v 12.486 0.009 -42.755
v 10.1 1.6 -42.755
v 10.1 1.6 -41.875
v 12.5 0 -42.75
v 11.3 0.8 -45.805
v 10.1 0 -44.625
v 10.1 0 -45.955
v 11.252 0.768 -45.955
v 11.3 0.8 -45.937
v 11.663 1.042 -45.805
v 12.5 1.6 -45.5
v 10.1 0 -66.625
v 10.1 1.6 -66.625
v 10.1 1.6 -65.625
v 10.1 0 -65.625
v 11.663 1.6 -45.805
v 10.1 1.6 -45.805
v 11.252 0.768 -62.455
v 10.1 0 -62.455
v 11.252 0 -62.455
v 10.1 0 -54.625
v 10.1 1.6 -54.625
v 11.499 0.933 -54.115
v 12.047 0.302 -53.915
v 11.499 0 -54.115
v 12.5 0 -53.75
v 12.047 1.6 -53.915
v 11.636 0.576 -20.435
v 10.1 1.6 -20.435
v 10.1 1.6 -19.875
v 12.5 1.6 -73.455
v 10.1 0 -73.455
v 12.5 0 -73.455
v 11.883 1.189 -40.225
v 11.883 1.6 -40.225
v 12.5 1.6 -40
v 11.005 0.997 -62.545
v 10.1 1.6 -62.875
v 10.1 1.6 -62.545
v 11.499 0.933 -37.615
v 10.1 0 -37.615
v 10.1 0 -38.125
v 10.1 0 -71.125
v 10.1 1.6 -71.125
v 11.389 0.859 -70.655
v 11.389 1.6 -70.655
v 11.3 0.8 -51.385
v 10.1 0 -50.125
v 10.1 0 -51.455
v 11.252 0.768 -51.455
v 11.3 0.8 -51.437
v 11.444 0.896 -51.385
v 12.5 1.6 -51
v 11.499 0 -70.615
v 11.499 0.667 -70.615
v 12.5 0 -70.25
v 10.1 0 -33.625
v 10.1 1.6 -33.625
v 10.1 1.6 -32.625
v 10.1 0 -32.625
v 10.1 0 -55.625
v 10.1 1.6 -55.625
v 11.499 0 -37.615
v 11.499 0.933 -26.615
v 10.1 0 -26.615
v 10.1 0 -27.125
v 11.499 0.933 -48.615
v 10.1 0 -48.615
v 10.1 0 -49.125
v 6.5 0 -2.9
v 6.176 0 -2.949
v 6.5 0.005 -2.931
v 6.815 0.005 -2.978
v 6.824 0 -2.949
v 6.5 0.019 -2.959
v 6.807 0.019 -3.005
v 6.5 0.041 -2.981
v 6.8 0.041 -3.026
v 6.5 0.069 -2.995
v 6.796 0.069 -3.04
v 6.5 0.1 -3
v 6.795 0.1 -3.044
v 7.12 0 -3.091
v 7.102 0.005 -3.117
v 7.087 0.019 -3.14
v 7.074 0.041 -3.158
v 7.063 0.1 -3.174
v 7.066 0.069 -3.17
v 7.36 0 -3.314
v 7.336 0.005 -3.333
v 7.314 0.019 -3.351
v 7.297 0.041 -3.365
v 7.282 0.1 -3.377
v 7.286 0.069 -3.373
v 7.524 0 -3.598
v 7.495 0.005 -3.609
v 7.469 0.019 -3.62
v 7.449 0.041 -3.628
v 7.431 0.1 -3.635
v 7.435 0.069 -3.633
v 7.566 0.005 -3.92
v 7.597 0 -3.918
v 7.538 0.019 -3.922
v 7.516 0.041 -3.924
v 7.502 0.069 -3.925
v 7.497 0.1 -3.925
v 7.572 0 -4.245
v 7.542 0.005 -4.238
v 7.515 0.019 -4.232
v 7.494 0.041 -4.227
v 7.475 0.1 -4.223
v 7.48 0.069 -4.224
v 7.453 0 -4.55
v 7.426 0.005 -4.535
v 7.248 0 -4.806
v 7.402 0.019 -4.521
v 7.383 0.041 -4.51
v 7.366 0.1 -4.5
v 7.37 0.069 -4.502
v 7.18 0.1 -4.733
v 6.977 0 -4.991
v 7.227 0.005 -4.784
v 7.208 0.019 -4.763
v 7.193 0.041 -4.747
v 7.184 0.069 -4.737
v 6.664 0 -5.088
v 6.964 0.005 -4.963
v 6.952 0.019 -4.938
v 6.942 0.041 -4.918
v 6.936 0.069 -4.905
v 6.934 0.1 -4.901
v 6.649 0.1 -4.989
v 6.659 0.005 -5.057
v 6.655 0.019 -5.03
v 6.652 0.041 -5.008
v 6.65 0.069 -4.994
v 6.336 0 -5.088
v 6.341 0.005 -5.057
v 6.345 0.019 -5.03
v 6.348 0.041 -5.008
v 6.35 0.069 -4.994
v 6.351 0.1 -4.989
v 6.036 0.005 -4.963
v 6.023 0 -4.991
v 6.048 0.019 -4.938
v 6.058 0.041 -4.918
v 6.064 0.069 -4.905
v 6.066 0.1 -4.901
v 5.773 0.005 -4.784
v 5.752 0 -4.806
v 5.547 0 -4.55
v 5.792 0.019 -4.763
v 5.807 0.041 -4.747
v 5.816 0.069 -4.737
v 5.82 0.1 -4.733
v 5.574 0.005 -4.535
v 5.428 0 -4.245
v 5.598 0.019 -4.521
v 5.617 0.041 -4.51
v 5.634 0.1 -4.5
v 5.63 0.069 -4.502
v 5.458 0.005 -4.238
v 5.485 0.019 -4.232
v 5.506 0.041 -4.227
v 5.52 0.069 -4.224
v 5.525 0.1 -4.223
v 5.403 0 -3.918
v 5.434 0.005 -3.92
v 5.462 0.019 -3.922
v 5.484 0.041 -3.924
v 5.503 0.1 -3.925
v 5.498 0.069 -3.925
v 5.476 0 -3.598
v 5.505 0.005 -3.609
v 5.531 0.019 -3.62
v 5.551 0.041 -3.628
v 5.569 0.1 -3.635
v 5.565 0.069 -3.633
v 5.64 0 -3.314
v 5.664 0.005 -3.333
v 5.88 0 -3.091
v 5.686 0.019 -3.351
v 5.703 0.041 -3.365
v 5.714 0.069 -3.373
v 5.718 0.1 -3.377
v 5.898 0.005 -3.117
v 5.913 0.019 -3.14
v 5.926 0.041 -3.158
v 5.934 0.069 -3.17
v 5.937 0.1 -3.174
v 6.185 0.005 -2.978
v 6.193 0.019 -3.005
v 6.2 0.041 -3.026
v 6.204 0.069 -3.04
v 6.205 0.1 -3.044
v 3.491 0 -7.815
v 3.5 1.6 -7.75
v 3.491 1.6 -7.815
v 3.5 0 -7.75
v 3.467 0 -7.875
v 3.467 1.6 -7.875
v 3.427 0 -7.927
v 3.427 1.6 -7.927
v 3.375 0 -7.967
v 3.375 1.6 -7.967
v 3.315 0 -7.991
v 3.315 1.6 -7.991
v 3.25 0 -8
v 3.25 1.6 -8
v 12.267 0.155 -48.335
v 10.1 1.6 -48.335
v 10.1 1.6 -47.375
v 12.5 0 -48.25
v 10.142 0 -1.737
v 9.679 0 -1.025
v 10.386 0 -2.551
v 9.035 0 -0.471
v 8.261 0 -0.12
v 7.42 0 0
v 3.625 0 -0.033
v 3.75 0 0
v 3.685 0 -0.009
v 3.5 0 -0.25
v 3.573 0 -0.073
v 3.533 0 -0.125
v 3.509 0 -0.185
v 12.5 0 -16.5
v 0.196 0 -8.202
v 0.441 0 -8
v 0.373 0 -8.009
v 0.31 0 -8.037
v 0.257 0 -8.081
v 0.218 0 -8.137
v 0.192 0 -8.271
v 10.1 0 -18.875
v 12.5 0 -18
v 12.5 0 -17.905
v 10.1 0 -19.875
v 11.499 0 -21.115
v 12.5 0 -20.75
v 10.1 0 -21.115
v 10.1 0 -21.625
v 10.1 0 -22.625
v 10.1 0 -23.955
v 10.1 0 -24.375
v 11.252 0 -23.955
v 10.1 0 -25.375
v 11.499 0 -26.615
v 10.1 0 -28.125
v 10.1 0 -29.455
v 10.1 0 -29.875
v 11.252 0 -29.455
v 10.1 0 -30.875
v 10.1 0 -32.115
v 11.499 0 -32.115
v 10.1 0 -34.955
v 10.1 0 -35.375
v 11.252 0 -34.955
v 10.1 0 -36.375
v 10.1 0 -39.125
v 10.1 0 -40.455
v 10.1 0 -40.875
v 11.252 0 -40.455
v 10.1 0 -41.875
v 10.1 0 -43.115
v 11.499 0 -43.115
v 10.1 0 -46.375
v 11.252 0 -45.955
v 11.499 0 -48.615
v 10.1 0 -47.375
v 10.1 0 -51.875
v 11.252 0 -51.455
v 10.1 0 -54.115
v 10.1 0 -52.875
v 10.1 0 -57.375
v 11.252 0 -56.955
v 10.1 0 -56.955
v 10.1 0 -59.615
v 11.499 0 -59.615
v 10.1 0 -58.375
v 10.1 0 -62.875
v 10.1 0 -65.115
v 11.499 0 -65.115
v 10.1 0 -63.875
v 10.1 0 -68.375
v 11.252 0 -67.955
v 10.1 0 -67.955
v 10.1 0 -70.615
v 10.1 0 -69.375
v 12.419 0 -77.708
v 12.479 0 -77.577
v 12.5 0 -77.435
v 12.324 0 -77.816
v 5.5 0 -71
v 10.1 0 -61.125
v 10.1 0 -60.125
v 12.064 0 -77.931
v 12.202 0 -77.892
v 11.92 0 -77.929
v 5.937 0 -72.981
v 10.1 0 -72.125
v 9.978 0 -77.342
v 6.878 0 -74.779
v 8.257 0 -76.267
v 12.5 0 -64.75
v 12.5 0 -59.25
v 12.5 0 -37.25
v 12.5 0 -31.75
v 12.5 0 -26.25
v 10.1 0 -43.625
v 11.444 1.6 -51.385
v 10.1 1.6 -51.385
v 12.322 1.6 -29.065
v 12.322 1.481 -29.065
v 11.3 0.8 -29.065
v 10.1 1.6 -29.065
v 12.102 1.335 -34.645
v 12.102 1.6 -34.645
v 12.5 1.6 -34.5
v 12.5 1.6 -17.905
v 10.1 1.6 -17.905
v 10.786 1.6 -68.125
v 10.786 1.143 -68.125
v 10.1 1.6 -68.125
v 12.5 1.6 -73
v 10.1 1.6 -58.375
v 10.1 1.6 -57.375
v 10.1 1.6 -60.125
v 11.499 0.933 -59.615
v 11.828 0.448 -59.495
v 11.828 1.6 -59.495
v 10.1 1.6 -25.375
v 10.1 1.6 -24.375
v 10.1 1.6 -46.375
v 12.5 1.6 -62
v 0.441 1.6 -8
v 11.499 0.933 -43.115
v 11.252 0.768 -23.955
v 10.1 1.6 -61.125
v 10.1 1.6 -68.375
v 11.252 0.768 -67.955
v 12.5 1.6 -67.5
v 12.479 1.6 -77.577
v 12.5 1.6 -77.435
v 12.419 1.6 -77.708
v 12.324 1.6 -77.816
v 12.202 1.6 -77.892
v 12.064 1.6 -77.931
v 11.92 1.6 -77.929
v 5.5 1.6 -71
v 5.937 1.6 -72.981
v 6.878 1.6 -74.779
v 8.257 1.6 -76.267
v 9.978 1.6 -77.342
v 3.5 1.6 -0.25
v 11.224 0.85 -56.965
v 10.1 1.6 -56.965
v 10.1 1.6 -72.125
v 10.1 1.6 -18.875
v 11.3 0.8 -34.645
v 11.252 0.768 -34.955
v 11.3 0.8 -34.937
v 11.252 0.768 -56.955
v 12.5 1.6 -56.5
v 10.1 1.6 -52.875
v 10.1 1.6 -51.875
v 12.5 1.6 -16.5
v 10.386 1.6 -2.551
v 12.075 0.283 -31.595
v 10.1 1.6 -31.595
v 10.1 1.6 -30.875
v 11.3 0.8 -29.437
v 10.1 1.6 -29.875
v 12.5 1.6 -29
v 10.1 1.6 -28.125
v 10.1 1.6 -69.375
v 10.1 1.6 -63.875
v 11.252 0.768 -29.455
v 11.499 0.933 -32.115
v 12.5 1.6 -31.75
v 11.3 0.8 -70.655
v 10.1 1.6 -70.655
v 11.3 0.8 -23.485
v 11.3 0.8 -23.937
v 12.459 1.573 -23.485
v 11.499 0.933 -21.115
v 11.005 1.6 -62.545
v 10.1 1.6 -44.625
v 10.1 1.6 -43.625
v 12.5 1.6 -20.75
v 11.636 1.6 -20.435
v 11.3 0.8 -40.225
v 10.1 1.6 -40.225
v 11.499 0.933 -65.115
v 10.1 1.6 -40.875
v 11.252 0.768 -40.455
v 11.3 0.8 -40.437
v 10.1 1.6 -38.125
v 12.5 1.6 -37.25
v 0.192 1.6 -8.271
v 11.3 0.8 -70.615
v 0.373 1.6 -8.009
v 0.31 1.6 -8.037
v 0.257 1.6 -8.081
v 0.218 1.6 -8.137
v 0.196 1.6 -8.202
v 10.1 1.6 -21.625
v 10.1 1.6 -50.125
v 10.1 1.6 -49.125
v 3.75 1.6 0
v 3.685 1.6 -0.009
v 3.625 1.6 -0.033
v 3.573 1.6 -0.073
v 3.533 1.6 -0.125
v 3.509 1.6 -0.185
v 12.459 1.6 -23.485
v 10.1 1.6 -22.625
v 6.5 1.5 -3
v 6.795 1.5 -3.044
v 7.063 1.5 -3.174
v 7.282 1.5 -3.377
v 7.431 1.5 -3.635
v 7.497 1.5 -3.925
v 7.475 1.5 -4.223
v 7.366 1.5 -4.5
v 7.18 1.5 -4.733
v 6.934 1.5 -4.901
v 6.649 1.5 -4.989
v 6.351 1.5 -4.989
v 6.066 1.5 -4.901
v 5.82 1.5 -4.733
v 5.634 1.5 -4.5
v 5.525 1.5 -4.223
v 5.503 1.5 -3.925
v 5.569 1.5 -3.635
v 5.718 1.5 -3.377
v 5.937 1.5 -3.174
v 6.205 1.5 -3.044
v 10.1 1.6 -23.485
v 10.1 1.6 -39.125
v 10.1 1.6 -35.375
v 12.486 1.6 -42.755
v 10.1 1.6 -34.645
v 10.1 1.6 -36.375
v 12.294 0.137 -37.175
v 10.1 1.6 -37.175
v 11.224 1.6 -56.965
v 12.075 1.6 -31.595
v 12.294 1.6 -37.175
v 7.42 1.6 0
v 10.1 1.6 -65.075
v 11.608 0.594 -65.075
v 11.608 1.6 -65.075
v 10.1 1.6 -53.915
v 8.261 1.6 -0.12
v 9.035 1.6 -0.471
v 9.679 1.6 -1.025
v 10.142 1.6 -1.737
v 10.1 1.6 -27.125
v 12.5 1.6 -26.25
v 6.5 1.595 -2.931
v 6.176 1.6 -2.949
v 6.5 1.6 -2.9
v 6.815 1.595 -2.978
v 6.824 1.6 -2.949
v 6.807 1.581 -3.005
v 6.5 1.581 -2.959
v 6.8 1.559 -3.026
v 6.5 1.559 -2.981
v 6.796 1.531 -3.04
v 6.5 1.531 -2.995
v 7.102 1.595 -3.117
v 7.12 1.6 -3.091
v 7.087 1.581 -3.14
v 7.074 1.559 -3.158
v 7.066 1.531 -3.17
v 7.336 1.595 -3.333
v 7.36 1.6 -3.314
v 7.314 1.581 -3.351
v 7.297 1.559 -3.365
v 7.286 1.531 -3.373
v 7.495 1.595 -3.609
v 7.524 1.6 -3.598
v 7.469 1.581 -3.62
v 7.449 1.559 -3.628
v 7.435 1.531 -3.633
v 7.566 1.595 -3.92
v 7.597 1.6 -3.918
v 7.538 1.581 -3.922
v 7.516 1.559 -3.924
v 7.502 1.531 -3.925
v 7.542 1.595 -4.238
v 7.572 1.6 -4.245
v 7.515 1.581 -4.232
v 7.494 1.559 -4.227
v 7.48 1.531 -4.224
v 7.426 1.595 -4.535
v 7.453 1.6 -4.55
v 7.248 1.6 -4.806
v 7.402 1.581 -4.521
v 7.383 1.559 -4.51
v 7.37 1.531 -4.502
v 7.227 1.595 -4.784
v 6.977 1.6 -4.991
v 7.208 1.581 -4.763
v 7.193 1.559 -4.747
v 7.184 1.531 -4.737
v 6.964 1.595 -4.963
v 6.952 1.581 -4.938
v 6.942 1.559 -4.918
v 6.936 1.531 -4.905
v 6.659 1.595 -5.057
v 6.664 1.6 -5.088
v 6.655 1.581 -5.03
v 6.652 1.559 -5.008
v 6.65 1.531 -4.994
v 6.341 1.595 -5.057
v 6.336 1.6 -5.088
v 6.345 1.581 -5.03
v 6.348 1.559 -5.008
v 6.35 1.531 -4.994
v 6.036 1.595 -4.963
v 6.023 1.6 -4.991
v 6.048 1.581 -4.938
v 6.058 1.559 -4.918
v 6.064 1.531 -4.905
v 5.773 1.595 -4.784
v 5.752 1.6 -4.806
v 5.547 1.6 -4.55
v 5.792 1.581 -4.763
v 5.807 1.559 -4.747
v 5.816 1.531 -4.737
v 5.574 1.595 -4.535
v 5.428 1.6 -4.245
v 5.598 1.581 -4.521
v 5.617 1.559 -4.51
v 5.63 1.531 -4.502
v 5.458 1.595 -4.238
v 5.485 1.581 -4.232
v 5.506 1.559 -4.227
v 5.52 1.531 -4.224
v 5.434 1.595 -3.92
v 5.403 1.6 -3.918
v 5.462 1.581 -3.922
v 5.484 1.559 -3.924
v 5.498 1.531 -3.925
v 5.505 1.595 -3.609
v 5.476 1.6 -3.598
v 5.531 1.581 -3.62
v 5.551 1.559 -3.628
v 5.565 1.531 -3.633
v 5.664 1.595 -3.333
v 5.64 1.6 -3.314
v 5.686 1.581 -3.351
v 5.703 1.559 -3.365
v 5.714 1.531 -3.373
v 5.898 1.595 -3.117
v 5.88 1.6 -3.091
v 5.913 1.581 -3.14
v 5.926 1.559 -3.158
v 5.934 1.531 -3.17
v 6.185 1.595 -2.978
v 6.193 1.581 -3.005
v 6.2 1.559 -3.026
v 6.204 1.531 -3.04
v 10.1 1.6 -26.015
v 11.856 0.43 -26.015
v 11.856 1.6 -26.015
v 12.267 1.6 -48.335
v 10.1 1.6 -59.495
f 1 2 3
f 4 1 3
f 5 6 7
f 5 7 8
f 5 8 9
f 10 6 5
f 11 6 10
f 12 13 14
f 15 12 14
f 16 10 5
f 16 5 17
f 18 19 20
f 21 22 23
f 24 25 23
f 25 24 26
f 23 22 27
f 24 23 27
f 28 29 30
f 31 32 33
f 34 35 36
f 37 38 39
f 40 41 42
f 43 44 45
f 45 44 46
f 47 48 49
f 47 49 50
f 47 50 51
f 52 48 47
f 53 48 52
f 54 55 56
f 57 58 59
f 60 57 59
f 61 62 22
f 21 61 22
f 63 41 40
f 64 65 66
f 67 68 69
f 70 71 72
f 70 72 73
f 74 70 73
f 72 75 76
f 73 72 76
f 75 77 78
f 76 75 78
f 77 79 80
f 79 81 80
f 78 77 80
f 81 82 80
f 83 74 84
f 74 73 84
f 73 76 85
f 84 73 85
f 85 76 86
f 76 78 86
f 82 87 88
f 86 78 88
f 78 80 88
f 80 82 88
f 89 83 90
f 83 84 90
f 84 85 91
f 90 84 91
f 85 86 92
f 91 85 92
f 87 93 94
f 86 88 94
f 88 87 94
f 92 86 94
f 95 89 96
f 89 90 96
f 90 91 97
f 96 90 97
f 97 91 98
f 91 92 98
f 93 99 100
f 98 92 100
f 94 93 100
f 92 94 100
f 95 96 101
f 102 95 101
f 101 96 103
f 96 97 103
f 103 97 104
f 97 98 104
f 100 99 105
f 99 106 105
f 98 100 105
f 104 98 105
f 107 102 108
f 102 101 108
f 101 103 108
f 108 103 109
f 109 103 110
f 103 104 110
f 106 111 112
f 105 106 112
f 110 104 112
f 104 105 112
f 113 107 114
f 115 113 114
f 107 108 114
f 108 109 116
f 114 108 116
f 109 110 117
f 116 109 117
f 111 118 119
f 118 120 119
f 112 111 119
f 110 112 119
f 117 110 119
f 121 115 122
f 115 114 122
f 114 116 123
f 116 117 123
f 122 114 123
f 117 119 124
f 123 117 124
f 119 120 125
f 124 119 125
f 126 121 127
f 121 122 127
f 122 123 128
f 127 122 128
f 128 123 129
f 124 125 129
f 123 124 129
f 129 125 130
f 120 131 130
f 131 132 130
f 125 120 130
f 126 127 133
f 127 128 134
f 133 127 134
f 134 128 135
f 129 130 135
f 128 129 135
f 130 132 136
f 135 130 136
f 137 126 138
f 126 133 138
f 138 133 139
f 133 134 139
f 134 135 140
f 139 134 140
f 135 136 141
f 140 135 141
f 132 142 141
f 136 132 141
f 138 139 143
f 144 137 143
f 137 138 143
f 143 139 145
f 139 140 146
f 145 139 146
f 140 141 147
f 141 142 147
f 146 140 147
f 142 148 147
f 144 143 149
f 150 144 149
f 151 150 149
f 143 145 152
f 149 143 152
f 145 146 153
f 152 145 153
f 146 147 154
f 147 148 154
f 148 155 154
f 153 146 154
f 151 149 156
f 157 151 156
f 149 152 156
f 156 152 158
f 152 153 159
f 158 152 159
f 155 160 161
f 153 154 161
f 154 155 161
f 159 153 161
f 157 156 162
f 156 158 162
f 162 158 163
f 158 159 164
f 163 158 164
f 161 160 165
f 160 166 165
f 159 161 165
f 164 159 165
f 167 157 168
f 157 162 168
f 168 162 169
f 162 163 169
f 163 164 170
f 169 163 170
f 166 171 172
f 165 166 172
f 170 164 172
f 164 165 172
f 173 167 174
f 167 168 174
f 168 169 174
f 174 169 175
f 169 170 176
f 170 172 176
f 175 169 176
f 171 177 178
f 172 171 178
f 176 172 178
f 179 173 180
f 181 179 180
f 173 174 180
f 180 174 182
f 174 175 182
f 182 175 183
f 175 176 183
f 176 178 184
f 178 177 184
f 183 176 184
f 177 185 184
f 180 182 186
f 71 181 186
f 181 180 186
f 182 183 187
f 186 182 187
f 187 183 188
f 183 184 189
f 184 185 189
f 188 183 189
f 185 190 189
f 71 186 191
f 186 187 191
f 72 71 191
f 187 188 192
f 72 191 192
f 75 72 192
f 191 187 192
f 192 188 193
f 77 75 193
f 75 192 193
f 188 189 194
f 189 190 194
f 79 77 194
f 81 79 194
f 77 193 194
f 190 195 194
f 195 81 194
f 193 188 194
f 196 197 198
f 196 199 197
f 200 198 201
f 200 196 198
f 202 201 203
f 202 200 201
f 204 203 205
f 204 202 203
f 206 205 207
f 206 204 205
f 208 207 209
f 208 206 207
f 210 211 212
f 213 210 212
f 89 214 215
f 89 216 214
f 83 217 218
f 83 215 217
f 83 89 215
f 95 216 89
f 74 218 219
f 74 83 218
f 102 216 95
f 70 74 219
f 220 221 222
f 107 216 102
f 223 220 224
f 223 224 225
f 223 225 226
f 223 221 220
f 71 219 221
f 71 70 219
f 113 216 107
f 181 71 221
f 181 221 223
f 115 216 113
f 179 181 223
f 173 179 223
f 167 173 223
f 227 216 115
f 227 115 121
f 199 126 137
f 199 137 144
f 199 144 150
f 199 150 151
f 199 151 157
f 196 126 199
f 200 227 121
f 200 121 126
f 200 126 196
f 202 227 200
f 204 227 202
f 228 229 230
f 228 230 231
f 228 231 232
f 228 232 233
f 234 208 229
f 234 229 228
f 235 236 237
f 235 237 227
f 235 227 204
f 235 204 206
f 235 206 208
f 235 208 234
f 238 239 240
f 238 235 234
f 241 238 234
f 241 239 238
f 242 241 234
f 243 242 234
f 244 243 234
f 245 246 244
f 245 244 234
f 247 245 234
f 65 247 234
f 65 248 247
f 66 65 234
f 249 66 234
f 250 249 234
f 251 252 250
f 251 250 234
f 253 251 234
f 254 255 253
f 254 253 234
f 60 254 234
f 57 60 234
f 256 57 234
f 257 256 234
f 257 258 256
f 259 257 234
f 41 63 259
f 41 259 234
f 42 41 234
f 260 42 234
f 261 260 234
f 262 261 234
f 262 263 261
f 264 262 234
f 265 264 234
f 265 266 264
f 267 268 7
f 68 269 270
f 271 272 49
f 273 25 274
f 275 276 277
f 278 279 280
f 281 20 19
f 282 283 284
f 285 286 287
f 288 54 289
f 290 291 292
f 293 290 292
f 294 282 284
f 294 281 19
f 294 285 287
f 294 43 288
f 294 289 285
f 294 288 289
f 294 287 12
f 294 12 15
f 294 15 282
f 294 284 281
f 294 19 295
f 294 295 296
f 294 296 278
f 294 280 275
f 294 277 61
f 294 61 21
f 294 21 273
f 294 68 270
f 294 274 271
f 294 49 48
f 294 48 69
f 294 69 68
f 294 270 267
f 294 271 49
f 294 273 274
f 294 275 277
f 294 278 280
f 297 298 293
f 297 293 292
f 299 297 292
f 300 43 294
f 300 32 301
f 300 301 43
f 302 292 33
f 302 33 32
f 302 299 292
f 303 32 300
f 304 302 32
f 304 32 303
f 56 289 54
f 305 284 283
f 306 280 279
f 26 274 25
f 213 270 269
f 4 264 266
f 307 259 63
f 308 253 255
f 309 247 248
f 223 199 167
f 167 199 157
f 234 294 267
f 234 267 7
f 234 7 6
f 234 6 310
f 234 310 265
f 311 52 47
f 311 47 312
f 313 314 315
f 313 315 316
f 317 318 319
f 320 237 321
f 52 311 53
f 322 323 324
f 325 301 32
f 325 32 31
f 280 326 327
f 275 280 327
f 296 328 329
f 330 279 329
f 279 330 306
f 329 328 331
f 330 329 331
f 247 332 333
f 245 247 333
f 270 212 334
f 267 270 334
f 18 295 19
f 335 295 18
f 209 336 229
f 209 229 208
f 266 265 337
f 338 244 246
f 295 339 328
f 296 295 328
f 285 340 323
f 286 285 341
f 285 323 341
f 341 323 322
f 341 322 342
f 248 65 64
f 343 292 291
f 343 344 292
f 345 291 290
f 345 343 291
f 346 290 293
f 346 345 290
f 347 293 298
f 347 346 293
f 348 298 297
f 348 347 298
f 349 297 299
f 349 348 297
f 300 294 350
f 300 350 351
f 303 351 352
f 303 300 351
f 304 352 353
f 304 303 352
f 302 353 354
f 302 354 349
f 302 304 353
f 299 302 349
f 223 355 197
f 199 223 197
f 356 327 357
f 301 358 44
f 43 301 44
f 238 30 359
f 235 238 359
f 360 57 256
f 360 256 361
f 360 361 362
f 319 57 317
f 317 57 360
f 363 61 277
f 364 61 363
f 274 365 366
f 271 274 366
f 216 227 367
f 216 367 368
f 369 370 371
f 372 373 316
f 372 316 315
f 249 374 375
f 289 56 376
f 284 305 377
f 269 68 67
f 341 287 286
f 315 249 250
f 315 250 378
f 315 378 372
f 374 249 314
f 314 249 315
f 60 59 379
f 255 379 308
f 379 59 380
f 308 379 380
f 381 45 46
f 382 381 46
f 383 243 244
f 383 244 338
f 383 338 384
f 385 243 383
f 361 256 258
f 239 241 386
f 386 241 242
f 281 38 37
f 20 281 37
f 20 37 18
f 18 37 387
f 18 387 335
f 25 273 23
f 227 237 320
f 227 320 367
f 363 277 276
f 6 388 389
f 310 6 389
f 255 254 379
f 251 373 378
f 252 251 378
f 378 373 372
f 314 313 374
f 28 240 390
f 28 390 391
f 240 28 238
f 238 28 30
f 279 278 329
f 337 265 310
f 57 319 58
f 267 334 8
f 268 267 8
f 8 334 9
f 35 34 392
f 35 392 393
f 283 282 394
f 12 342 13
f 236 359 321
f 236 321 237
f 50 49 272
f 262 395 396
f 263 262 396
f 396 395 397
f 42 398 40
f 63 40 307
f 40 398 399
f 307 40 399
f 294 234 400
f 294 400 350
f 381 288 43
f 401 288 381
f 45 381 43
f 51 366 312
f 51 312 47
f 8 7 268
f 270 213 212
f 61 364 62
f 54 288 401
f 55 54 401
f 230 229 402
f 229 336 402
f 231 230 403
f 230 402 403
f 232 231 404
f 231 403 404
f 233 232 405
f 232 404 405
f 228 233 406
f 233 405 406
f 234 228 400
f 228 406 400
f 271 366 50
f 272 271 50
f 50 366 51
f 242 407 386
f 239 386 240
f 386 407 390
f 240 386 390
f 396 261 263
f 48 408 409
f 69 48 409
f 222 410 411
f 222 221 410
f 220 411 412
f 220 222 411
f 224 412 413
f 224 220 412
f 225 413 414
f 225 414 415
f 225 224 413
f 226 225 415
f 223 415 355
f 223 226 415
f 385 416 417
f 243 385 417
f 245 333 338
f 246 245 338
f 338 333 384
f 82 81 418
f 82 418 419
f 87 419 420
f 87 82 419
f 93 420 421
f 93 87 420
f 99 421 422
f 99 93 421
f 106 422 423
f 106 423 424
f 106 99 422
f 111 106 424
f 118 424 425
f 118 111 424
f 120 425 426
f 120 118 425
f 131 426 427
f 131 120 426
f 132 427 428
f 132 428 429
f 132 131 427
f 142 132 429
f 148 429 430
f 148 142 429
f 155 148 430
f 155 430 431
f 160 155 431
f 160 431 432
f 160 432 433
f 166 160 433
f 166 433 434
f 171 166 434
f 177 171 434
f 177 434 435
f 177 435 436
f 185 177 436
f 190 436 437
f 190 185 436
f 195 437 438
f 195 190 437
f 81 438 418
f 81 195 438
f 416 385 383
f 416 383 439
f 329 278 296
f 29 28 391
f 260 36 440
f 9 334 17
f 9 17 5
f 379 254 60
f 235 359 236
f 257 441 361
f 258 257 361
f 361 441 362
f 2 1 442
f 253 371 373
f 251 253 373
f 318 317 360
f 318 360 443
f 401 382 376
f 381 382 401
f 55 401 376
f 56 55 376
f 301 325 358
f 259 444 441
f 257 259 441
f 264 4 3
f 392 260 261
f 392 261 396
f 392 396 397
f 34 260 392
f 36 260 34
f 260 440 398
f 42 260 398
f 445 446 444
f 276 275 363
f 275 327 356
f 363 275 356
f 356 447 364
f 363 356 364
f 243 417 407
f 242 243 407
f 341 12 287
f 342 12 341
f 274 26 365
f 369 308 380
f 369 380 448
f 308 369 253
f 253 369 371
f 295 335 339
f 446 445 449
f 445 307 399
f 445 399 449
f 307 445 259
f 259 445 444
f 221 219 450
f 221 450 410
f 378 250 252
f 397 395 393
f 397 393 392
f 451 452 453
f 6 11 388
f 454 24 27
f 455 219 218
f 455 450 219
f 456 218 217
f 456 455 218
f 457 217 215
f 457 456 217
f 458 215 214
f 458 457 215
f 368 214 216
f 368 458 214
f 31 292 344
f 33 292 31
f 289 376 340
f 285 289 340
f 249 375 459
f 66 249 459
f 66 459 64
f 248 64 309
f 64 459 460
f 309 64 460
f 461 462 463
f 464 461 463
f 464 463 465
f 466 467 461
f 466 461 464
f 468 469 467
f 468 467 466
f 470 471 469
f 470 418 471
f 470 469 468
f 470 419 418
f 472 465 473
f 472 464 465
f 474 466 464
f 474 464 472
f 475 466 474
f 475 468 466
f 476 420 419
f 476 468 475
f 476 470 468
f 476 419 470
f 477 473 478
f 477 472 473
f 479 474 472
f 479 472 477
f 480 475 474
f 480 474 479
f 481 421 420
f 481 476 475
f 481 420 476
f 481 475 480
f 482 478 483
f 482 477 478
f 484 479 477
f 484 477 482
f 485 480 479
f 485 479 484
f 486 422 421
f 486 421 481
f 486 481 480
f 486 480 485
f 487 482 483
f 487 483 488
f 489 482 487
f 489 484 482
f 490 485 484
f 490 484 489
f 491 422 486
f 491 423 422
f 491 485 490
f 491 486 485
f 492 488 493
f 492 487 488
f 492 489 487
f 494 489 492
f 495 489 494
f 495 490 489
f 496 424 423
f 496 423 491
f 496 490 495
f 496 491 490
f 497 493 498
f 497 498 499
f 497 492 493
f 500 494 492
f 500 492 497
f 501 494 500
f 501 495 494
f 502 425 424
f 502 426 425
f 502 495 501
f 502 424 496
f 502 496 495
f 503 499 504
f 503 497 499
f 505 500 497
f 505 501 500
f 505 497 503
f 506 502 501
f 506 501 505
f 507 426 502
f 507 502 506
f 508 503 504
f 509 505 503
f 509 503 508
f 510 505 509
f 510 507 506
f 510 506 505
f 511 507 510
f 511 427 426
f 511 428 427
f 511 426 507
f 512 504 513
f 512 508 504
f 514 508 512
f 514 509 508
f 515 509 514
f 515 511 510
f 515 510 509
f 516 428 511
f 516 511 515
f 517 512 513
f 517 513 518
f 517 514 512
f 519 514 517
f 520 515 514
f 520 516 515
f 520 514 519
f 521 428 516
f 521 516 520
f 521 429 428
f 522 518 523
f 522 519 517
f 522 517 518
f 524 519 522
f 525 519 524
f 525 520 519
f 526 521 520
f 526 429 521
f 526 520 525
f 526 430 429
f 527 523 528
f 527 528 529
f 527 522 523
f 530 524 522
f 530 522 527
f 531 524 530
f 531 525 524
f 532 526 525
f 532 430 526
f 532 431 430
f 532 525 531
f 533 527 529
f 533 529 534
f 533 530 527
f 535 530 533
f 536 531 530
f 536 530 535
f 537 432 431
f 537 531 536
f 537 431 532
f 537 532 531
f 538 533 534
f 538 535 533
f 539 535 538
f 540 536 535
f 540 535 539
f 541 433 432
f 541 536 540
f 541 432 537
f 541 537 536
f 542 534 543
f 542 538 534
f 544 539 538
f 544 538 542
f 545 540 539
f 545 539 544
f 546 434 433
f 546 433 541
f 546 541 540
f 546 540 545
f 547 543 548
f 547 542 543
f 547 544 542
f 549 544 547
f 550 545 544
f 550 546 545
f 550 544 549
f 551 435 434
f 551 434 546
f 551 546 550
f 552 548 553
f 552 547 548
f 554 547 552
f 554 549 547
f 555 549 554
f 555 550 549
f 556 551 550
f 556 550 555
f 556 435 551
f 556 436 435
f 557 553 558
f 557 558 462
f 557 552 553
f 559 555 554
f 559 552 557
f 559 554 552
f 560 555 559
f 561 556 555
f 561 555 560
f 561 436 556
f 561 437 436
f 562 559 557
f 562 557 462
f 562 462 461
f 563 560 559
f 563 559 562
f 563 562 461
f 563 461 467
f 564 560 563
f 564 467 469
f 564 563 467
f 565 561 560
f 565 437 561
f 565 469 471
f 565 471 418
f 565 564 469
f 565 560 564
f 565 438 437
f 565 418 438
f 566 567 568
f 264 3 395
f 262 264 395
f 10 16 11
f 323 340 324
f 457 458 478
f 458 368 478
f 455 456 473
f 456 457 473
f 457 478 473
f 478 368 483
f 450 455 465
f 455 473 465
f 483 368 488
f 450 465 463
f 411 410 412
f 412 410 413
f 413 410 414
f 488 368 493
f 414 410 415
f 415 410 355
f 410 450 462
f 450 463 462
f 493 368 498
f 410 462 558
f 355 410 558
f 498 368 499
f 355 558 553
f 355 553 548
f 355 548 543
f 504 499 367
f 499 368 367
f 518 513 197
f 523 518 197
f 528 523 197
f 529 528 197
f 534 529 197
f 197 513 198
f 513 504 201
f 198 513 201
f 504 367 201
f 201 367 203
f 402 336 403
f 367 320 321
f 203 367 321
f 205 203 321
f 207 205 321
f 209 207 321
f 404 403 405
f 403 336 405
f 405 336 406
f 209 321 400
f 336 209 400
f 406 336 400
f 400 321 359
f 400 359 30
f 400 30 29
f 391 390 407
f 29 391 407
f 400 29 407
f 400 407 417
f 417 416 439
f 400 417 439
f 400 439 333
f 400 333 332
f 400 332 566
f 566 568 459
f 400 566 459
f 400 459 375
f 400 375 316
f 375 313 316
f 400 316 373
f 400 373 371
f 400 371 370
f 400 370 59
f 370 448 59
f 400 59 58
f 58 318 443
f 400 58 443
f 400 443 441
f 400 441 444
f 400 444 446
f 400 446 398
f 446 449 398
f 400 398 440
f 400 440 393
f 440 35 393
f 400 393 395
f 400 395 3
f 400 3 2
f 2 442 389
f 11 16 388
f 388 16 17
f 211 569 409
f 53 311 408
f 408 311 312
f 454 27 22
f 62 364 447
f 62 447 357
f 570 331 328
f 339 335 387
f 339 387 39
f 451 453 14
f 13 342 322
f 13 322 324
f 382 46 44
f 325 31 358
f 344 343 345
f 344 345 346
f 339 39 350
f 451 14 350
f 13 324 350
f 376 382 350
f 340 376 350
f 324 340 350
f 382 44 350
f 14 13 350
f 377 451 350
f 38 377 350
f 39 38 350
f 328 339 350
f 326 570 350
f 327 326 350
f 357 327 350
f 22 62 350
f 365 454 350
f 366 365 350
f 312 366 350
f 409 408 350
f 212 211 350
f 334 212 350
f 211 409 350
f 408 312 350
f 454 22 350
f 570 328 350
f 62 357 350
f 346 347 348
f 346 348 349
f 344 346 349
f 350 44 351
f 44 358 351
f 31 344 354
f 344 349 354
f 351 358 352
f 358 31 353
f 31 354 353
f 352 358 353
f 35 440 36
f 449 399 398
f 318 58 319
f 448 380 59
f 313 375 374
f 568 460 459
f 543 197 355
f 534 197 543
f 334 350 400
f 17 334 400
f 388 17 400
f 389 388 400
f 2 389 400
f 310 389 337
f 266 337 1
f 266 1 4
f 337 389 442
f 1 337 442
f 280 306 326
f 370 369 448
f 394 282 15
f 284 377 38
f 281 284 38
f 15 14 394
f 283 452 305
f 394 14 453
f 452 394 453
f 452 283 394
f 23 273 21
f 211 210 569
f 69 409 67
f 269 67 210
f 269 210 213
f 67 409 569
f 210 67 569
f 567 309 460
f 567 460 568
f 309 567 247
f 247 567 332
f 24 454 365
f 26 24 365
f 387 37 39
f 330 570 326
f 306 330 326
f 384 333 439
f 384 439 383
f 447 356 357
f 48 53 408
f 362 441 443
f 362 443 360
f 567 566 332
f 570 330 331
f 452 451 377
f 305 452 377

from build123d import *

# Parameters (mm, degrees)
SKETCH1_R              = 1
BOSS_EXTRUDE1_DEPTH    = 1.6
SKETCH2_W              = 3.5
SKETCH2_H              = 8
CUT_EXTRUDE1_DEPTH     = 80.011454866
FILLET1_R              = 3
FILLET3_R              = 0.1
FILLET4_R              = 0.25
CUT_EXTRUDE2_DEPTH     = 80.011454866
LPATTERN1_COUNT        = 20
LPATTERN1_PITCH        = 2.75
FILLET5_R              = 0.5
CUT_EXTRUDE3_START     = 5.602471982
CUT_EXTRUDE3_OUTLINE_W = 6
CUT_EXTRUDE3_OUTLINE_H = 2.84
CUT_EXTRUDE3_DEPTH     = 1.331280471
CUT_EXTRUDE4_REACH     = 81.346
SKETCH7_W              = 2.53
SKETCH7_H              = 4


with BuildPart() as part:
    # Sketch1 → Boss-Extrude1 (new body)
    with BuildSketch(Plane(origin=(0, 0, 0), x_dir=(1, 0, 0), z_dir=(0, 1, 0))):
        with BuildLine():
            Line((0, 0), (0, 6))
            Line((0, 6), (5.5, 71))
            ThreePointArc((5.5, 71), (7.72044875, 75.77955125), (12.5, 78))
            Line((12.5, 78), (12.5, 16.5))
            Line((12.5, 16.5), (10, 0))
            Line((10, 0), (0, 0))
        make_face()
        with Locations(Location((6.5, 4, 0), (0, 0, 270))):
            Circle(SKETCH1_R, mode=Mode.SUBTRACT)
    extrude(amount=BOSS_EXTRUDE1_DEPTH)

    # Sketch2 → Cut-Extrude1 (cut, through all)
    with BuildSketch(Plane(origin=(0, 1.6, 0), x_dir=(1, 0, 0), z_dir=(0, 1, 0))):
        with Locations((1.75, 4)):
            Rectangle(SKETCH2_W, SKETCH2_H)
    extrude(amount=-CUT_EXTRUDE1_DEPTH, mode=Mode.SUBTRACT)

    # Fillet1
    fillet1_edges = [part.edges().sort_by_distance(p)[0] for p in [
        (10, 0.8, 0),
    ]]
    fillet(fillet1_edges, radius=FILLET1_R)

    # Fillet3
    fillet3_edges = [part.edges().sort_by_distance(p)[0] for p in [
        (6.5, 0, -5),
        (6.5, 1.6, -5),
    ]]
    fillet(fillet3_edges, radius=FILLET3_R)

    # Fillet4
    fillet4_edges = [part.edges().sort_by_distance(p)[0] for p in [
        (0.169230769, 0.8, -8),
        (3.5, 0.8, -8),
        (3.5, 0.8, 0),
    ]]
    fillet(fillet4_edges, radius=FILLET4_R)

    # Sketch3 → Cut-Extrude2 (cut, through all)
    with BuildSketch(Plane(origin=(0, 1.6, 0), x_dir=(1, 0, 0), z_dir=(0, 1, 0))):
        Polygon((12.5, 73), (10.1, 72.125), (10.1, 71.125), (12.5, 70.25), align=None)
    cut_extrude2 = extrude(amount=-CUT_EXTRUDE2_DEPTH, mode=Mode.SUBTRACT)

    # LPattern1: Cut-Extrude2 ×20
    with Locations(*[(0, 0, i * LPATTERN1_PITCH) for i in range(1, LPATTERN1_COUNT)]):
        add(cut_extrude2, mode=Mode.SUBTRACT)

    # Fillet5
    fillet5_edges = [part.edges().sort_by_distance(p)[0] for p in [
        (12.5, 0.8, -78),
    ]]
    fillet(fillet5_edges, radius=FILLET5_R)

    # Cut-Extrude3: read off the stored shape, not the designer's step
    # Cut-Extrude3 outline → Cut-Extrude3 (cut)
    with BuildSketch(Plane(origin=(0, 0, 0), x_dir=(0.8320502943378438, 0.5547001962252289, 0), z_dir=(0.5547001962252289, -0.8320502943378438, 0)).offset(CUT_EXTRUDE3_START)):
        with Locations((10, -22.535035801)):
            Rectangle(CUT_EXTRUDE3_OUTLINE_W, CUT_EXTRUDE3_OUTLINE_H)
        with Locations((10, -28.035035801)):
            Rectangle(CUT_EXTRUDE3_OUTLINE_W, CUT_EXTRUDE3_OUTLINE_H)
        with Locations((10, -33.535035801)):
            Rectangle(CUT_EXTRUDE3_OUTLINE_W, CUT_EXTRUDE3_OUTLINE_H)
        with Locations((10, -39.035035801)):
            Rectangle(CUT_EXTRUDE3_OUTLINE_W, CUT_EXTRUDE3_OUTLINE_H)
        with Locations((10, -44.535035801)):
            Rectangle(CUT_EXTRUDE3_OUTLINE_W, CUT_EXTRUDE3_OUTLINE_H)
        with Locations((10, -50.035035801)):
            Rectangle(CUT_EXTRUDE3_OUTLINE_W, CUT_EXTRUDE3_OUTLINE_H)
        with Locations((10, -55.535035801)):
            Rectangle(CUT_EXTRUDE3_OUTLINE_W, CUT_EXTRUDE3_OUTLINE_H)
        with Locations((10, -61.035035801)):
            Rectangle(CUT_EXTRUDE3_OUTLINE_W, CUT_EXTRUDE3_OUTLINE_H)
        with Locations((10, -66.535035801)):
            Rectangle(CUT_EXTRUDE3_OUTLINE_W, CUT_EXTRUDE3_OUTLINE_H)
        with Locations((10, -72.035035801)):
            Rectangle(CUT_EXTRUDE3_OUTLINE_W, CUT_EXTRUDE3_OUTLINE_H)
    extrude(amount=CUT_EXTRUDE3_DEPTH, mode=Mode.SUBTRACT)

    # Cut-Extrude4: up to this plane
    cut_extrude4_end = Plane(origin=(10.1, 1.6, 0), z_dir=(0.5547001962252291, 0.8320502943378437, 0))
    # Sketch7 → Cut-Extrude4 (cut, up to the surface)
    with BuildSketch(Plane(origin=(15, 0, 0), x_dir=(0, 0, -1), z_dir=(1, 0, 0)), mode=Mode.PRIVATE) as cut_extrude4_sk1:
        with Locations((69.390035801, 0.6)):
            Rectangle(SKETCH7_W, SKETCH7_H)
    cut_extrude4_tool1 = split(extrude(cut_extrude4_sk1.sketch, amount=-CUT_EXTRUDE4_REACH, mode=Mode.PRIVATE), bisect_by=cut_extrude4_end, keep=Keep.BOTH, mode=Mode.PRIVATE)
    add(cut_extrude4_tool1.solids().sort_by_distance((15, 0.6, -69.390036))[0], mode=Mode.SUBTRACT)
    # Sketch7 → Cut-Extrude4 (cut, up to the surface)
    with BuildSketch(Plane(origin=(15, 0, 0), x_dir=(0, 0, -1), z_dir=(1, 0, 0)), mode=Mode.PRIVATE) as cut_extrude4_sk2:
        with Locations((63.810035801, 0.6)):
            Rectangle(SKETCH7_W, SKETCH7_H)
    cut_extrude4_tool2 = split(extrude(cut_extrude4_sk2.sketch, amount=-CUT_EXTRUDE4_REACH, mode=Mode.PRIVATE), bisect_by=cut_extrude4_end, keep=Keep.BOTH, mode=Mode.PRIVATE)
    add(cut_extrude4_tool2.solids().sort_by_distance((15, 0.6, -63.810036))[0], mode=Mode.SUBTRACT)
    # Sketch7 → Cut-Extrude4 (cut, up to the surface)
    with BuildSketch(Plane(origin=(15, 0, 0), x_dir=(0, 0, -1), z_dir=(1, 0, 0)), mode=Mode.PRIVATE) as cut_extrude4_sk3:
        with Locations((58.230035801, 0.6)):
            Rectangle(SKETCH7_W, SKETCH7_H)
    cut_extrude4_tool3 = split(extrude(cut_extrude4_sk3.sketch, amount=-CUT_EXTRUDE4_REACH, mode=Mode.PRIVATE), bisect_by=cut_extrude4_end, keep=Keep.BOTH, mode=Mode.PRIVATE)
    add(cut_extrude4_tool3.solids().sort_by_distance((15, 0.6, -58.230036))[0], mode=Mode.SUBTRACT)
    # Sketch7 → Cut-Extrude4 (cut, up to the surface)
    with BuildSketch(Plane(origin=(15, 0, 0), x_dir=(0, 0, -1), z_dir=(1, 0, 0)), mode=Mode.PRIVATE) as cut_extrude4_sk4:
        with Locations((52.650035801, 0.6)):
            Rectangle(SKETCH7_W, SKETCH7_H)
    cut_extrude4_tool4 = split(extrude(cut_extrude4_sk4.sketch, amount=-CUT_EXTRUDE4_REACH, mode=Mode.PRIVATE), bisect_by=cut_extrude4_end, keep=Keep.BOTH, mode=Mode.PRIVATE)
    add(cut_extrude4_tool4.solids().sort_by_distance((15, 0.6, -52.650036))[0], mode=Mode.SUBTRACT)
    # Sketch7 → Cut-Extrude4 (cut, up to the surface)
    with BuildSketch(Plane(origin=(15, 0, 0), x_dir=(0, 0, -1), z_dir=(1, 0, 0)), mode=Mode.PRIVATE) as cut_extrude4_sk5:
        with Locations((47.070035801, 0.6)):
            Rectangle(SKETCH7_W, SKETCH7_H)
    cut_extrude4_tool5 = split(extrude(cut_extrude4_sk5.sketch, amount=-CUT_EXTRUDE4_REACH, mode=Mode.PRIVATE), bisect_by=cut_extrude4_end, keep=Keep.BOTH, mode=Mode.PRIVATE)
    add(cut_extrude4_tool5.solids().sort_by_distance((15, 0.6, -47.070036))[0], mode=Mode.SUBTRACT)
    # Sketch7 → Cut-Extrude4 (cut, up to the surface)
    with BuildSketch(Plane(origin=(15, 0, 0), x_dir=(0, 0, -1), z_dir=(1, 0, 0)), mode=Mode.PRIVATE) as cut_extrude4_sk6:
        with Locations((41.490035801, 0.6)):
            Rectangle(SKETCH7_W, SKETCH7_H)
    cut_extrude4_tool6 = split(extrude(cut_extrude4_sk6.sketch, amount=-CUT_EXTRUDE4_REACH, mode=Mode.PRIVATE), bisect_by=cut_extrude4_end, keep=Keep.BOTH, mode=Mode.PRIVATE)
    add(cut_extrude4_tool6.solids().sort_by_distance((15, 0.6, -41.490036))[0], mode=Mode.SUBTRACT)
    # Sketch7 → Cut-Extrude4 (cut, up to the surface)
    with BuildSketch(Plane(origin=(15, 0, 0), x_dir=(0, 0, -1), z_dir=(1, 0, 0)), mode=Mode.PRIVATE) as cut_extrude4_sk7:
        with Locations((35.910035801, 0.6)):
            Rectangle(SKETCH7_W, SKETCH7_H)
    cut_extrude4_tool7 = split(extrude(cut_extrude4_sk7.sketch, amount=-CUT_EXTRUDE4_REACH, mode=Mode.PRIVATE), bisect_by=cut_extrude4_end, keep=Keep.BOTH, mode=Mode.PRIVATE)
    add(cut_extrude4_tool7.solids().sort_by_distance((15, 0.6, -35.910036))[0], mode=Mode.SUBTRACT)
    # Sketch7 → Cut-Extrude4 (cut, up to the surface)
    with BuildSketch(Plane(origin=(15, 0, 0), x_dir=(0, 0, -1), z_dir=(1, 0, 0)), mode=Mode.PRIVATE) as cut_extrude4_sk8:
        with Locations((30.330035801, 0.6)):
            Rectangle(SKETCH7_W, SKETCH7_H)
    cut_extrude4_tool8 = split(extrude(cut_extrude4_sk8.sketch, amount=-CUT_EXTRUDE4_REACH, mode=Mode.PRIVATE), bisect_by=cut_extrude4_end, keep=Keep.BOTH, mode=Mode.PRIVATE)
    add(cut_extrude4_tool8.solids().sort_by_distance((15, 0.6, -30.330036))[0], mode=Mode.SUBTRACT)
    # Sketch7 → Cut-Extrude4 (cut, up to the surface)
    with BuildSketch(Plane(origin=(15, 0, 0), x_dir=(0, 0, -1), z_dir=(1, 0, 0)), mode=Mode.PRIVATE) as cut_extrude4_sk9:
        with Locations((24.750035801, 0.6)):
            Rectangle(SKETCH7_W, SKETCH7_H)
    cut_extrude4_tool9 = split(extrude(cut_extrude4_sk9.sketch, amount=-CUT_EXTRUDE4_REACH, mode=Mode.PRIVATE), bisect_by=cut_extrude4_end, keep=Keep.BOTH, mode=Mode.PRIVATE)
    add(cut_extrude4_tool9.solids().sort_by_distance((15, 0.6, -24.750036))[0], mode=Mode.SUBTRACT)
    # Sketch7 → Cut-Extrude4 (cut, up to the surface)
    with BuildSketch(Plane(origin=(15, 0, 0), x_dir=(0, 0, -1), z_dir=(1, 0, 0)), mode=Mode.PRIVATE) as cut_extrude4_sk10:
        with Locations((19.170035801, 0.6)):
            Rectangle(SKETCH7_W, SKETCH7_H)
    cut_extrude4_tool10 = split(extrude(cut_extrude4_sk10.sketch, amount=-CUT_EXTRUDE4_REACH, mode=Mode.PRIVATE), bisect_by=cut_extrude4_end, keep=Keep.BOTH, mode=Mode.PRIVATE)
    add(cut_extrude4_tool10.solids().sort_by_distance((15, 0.6, -19.170036))[0], mode=Mode.SUBTRACT)


solid = part.part
